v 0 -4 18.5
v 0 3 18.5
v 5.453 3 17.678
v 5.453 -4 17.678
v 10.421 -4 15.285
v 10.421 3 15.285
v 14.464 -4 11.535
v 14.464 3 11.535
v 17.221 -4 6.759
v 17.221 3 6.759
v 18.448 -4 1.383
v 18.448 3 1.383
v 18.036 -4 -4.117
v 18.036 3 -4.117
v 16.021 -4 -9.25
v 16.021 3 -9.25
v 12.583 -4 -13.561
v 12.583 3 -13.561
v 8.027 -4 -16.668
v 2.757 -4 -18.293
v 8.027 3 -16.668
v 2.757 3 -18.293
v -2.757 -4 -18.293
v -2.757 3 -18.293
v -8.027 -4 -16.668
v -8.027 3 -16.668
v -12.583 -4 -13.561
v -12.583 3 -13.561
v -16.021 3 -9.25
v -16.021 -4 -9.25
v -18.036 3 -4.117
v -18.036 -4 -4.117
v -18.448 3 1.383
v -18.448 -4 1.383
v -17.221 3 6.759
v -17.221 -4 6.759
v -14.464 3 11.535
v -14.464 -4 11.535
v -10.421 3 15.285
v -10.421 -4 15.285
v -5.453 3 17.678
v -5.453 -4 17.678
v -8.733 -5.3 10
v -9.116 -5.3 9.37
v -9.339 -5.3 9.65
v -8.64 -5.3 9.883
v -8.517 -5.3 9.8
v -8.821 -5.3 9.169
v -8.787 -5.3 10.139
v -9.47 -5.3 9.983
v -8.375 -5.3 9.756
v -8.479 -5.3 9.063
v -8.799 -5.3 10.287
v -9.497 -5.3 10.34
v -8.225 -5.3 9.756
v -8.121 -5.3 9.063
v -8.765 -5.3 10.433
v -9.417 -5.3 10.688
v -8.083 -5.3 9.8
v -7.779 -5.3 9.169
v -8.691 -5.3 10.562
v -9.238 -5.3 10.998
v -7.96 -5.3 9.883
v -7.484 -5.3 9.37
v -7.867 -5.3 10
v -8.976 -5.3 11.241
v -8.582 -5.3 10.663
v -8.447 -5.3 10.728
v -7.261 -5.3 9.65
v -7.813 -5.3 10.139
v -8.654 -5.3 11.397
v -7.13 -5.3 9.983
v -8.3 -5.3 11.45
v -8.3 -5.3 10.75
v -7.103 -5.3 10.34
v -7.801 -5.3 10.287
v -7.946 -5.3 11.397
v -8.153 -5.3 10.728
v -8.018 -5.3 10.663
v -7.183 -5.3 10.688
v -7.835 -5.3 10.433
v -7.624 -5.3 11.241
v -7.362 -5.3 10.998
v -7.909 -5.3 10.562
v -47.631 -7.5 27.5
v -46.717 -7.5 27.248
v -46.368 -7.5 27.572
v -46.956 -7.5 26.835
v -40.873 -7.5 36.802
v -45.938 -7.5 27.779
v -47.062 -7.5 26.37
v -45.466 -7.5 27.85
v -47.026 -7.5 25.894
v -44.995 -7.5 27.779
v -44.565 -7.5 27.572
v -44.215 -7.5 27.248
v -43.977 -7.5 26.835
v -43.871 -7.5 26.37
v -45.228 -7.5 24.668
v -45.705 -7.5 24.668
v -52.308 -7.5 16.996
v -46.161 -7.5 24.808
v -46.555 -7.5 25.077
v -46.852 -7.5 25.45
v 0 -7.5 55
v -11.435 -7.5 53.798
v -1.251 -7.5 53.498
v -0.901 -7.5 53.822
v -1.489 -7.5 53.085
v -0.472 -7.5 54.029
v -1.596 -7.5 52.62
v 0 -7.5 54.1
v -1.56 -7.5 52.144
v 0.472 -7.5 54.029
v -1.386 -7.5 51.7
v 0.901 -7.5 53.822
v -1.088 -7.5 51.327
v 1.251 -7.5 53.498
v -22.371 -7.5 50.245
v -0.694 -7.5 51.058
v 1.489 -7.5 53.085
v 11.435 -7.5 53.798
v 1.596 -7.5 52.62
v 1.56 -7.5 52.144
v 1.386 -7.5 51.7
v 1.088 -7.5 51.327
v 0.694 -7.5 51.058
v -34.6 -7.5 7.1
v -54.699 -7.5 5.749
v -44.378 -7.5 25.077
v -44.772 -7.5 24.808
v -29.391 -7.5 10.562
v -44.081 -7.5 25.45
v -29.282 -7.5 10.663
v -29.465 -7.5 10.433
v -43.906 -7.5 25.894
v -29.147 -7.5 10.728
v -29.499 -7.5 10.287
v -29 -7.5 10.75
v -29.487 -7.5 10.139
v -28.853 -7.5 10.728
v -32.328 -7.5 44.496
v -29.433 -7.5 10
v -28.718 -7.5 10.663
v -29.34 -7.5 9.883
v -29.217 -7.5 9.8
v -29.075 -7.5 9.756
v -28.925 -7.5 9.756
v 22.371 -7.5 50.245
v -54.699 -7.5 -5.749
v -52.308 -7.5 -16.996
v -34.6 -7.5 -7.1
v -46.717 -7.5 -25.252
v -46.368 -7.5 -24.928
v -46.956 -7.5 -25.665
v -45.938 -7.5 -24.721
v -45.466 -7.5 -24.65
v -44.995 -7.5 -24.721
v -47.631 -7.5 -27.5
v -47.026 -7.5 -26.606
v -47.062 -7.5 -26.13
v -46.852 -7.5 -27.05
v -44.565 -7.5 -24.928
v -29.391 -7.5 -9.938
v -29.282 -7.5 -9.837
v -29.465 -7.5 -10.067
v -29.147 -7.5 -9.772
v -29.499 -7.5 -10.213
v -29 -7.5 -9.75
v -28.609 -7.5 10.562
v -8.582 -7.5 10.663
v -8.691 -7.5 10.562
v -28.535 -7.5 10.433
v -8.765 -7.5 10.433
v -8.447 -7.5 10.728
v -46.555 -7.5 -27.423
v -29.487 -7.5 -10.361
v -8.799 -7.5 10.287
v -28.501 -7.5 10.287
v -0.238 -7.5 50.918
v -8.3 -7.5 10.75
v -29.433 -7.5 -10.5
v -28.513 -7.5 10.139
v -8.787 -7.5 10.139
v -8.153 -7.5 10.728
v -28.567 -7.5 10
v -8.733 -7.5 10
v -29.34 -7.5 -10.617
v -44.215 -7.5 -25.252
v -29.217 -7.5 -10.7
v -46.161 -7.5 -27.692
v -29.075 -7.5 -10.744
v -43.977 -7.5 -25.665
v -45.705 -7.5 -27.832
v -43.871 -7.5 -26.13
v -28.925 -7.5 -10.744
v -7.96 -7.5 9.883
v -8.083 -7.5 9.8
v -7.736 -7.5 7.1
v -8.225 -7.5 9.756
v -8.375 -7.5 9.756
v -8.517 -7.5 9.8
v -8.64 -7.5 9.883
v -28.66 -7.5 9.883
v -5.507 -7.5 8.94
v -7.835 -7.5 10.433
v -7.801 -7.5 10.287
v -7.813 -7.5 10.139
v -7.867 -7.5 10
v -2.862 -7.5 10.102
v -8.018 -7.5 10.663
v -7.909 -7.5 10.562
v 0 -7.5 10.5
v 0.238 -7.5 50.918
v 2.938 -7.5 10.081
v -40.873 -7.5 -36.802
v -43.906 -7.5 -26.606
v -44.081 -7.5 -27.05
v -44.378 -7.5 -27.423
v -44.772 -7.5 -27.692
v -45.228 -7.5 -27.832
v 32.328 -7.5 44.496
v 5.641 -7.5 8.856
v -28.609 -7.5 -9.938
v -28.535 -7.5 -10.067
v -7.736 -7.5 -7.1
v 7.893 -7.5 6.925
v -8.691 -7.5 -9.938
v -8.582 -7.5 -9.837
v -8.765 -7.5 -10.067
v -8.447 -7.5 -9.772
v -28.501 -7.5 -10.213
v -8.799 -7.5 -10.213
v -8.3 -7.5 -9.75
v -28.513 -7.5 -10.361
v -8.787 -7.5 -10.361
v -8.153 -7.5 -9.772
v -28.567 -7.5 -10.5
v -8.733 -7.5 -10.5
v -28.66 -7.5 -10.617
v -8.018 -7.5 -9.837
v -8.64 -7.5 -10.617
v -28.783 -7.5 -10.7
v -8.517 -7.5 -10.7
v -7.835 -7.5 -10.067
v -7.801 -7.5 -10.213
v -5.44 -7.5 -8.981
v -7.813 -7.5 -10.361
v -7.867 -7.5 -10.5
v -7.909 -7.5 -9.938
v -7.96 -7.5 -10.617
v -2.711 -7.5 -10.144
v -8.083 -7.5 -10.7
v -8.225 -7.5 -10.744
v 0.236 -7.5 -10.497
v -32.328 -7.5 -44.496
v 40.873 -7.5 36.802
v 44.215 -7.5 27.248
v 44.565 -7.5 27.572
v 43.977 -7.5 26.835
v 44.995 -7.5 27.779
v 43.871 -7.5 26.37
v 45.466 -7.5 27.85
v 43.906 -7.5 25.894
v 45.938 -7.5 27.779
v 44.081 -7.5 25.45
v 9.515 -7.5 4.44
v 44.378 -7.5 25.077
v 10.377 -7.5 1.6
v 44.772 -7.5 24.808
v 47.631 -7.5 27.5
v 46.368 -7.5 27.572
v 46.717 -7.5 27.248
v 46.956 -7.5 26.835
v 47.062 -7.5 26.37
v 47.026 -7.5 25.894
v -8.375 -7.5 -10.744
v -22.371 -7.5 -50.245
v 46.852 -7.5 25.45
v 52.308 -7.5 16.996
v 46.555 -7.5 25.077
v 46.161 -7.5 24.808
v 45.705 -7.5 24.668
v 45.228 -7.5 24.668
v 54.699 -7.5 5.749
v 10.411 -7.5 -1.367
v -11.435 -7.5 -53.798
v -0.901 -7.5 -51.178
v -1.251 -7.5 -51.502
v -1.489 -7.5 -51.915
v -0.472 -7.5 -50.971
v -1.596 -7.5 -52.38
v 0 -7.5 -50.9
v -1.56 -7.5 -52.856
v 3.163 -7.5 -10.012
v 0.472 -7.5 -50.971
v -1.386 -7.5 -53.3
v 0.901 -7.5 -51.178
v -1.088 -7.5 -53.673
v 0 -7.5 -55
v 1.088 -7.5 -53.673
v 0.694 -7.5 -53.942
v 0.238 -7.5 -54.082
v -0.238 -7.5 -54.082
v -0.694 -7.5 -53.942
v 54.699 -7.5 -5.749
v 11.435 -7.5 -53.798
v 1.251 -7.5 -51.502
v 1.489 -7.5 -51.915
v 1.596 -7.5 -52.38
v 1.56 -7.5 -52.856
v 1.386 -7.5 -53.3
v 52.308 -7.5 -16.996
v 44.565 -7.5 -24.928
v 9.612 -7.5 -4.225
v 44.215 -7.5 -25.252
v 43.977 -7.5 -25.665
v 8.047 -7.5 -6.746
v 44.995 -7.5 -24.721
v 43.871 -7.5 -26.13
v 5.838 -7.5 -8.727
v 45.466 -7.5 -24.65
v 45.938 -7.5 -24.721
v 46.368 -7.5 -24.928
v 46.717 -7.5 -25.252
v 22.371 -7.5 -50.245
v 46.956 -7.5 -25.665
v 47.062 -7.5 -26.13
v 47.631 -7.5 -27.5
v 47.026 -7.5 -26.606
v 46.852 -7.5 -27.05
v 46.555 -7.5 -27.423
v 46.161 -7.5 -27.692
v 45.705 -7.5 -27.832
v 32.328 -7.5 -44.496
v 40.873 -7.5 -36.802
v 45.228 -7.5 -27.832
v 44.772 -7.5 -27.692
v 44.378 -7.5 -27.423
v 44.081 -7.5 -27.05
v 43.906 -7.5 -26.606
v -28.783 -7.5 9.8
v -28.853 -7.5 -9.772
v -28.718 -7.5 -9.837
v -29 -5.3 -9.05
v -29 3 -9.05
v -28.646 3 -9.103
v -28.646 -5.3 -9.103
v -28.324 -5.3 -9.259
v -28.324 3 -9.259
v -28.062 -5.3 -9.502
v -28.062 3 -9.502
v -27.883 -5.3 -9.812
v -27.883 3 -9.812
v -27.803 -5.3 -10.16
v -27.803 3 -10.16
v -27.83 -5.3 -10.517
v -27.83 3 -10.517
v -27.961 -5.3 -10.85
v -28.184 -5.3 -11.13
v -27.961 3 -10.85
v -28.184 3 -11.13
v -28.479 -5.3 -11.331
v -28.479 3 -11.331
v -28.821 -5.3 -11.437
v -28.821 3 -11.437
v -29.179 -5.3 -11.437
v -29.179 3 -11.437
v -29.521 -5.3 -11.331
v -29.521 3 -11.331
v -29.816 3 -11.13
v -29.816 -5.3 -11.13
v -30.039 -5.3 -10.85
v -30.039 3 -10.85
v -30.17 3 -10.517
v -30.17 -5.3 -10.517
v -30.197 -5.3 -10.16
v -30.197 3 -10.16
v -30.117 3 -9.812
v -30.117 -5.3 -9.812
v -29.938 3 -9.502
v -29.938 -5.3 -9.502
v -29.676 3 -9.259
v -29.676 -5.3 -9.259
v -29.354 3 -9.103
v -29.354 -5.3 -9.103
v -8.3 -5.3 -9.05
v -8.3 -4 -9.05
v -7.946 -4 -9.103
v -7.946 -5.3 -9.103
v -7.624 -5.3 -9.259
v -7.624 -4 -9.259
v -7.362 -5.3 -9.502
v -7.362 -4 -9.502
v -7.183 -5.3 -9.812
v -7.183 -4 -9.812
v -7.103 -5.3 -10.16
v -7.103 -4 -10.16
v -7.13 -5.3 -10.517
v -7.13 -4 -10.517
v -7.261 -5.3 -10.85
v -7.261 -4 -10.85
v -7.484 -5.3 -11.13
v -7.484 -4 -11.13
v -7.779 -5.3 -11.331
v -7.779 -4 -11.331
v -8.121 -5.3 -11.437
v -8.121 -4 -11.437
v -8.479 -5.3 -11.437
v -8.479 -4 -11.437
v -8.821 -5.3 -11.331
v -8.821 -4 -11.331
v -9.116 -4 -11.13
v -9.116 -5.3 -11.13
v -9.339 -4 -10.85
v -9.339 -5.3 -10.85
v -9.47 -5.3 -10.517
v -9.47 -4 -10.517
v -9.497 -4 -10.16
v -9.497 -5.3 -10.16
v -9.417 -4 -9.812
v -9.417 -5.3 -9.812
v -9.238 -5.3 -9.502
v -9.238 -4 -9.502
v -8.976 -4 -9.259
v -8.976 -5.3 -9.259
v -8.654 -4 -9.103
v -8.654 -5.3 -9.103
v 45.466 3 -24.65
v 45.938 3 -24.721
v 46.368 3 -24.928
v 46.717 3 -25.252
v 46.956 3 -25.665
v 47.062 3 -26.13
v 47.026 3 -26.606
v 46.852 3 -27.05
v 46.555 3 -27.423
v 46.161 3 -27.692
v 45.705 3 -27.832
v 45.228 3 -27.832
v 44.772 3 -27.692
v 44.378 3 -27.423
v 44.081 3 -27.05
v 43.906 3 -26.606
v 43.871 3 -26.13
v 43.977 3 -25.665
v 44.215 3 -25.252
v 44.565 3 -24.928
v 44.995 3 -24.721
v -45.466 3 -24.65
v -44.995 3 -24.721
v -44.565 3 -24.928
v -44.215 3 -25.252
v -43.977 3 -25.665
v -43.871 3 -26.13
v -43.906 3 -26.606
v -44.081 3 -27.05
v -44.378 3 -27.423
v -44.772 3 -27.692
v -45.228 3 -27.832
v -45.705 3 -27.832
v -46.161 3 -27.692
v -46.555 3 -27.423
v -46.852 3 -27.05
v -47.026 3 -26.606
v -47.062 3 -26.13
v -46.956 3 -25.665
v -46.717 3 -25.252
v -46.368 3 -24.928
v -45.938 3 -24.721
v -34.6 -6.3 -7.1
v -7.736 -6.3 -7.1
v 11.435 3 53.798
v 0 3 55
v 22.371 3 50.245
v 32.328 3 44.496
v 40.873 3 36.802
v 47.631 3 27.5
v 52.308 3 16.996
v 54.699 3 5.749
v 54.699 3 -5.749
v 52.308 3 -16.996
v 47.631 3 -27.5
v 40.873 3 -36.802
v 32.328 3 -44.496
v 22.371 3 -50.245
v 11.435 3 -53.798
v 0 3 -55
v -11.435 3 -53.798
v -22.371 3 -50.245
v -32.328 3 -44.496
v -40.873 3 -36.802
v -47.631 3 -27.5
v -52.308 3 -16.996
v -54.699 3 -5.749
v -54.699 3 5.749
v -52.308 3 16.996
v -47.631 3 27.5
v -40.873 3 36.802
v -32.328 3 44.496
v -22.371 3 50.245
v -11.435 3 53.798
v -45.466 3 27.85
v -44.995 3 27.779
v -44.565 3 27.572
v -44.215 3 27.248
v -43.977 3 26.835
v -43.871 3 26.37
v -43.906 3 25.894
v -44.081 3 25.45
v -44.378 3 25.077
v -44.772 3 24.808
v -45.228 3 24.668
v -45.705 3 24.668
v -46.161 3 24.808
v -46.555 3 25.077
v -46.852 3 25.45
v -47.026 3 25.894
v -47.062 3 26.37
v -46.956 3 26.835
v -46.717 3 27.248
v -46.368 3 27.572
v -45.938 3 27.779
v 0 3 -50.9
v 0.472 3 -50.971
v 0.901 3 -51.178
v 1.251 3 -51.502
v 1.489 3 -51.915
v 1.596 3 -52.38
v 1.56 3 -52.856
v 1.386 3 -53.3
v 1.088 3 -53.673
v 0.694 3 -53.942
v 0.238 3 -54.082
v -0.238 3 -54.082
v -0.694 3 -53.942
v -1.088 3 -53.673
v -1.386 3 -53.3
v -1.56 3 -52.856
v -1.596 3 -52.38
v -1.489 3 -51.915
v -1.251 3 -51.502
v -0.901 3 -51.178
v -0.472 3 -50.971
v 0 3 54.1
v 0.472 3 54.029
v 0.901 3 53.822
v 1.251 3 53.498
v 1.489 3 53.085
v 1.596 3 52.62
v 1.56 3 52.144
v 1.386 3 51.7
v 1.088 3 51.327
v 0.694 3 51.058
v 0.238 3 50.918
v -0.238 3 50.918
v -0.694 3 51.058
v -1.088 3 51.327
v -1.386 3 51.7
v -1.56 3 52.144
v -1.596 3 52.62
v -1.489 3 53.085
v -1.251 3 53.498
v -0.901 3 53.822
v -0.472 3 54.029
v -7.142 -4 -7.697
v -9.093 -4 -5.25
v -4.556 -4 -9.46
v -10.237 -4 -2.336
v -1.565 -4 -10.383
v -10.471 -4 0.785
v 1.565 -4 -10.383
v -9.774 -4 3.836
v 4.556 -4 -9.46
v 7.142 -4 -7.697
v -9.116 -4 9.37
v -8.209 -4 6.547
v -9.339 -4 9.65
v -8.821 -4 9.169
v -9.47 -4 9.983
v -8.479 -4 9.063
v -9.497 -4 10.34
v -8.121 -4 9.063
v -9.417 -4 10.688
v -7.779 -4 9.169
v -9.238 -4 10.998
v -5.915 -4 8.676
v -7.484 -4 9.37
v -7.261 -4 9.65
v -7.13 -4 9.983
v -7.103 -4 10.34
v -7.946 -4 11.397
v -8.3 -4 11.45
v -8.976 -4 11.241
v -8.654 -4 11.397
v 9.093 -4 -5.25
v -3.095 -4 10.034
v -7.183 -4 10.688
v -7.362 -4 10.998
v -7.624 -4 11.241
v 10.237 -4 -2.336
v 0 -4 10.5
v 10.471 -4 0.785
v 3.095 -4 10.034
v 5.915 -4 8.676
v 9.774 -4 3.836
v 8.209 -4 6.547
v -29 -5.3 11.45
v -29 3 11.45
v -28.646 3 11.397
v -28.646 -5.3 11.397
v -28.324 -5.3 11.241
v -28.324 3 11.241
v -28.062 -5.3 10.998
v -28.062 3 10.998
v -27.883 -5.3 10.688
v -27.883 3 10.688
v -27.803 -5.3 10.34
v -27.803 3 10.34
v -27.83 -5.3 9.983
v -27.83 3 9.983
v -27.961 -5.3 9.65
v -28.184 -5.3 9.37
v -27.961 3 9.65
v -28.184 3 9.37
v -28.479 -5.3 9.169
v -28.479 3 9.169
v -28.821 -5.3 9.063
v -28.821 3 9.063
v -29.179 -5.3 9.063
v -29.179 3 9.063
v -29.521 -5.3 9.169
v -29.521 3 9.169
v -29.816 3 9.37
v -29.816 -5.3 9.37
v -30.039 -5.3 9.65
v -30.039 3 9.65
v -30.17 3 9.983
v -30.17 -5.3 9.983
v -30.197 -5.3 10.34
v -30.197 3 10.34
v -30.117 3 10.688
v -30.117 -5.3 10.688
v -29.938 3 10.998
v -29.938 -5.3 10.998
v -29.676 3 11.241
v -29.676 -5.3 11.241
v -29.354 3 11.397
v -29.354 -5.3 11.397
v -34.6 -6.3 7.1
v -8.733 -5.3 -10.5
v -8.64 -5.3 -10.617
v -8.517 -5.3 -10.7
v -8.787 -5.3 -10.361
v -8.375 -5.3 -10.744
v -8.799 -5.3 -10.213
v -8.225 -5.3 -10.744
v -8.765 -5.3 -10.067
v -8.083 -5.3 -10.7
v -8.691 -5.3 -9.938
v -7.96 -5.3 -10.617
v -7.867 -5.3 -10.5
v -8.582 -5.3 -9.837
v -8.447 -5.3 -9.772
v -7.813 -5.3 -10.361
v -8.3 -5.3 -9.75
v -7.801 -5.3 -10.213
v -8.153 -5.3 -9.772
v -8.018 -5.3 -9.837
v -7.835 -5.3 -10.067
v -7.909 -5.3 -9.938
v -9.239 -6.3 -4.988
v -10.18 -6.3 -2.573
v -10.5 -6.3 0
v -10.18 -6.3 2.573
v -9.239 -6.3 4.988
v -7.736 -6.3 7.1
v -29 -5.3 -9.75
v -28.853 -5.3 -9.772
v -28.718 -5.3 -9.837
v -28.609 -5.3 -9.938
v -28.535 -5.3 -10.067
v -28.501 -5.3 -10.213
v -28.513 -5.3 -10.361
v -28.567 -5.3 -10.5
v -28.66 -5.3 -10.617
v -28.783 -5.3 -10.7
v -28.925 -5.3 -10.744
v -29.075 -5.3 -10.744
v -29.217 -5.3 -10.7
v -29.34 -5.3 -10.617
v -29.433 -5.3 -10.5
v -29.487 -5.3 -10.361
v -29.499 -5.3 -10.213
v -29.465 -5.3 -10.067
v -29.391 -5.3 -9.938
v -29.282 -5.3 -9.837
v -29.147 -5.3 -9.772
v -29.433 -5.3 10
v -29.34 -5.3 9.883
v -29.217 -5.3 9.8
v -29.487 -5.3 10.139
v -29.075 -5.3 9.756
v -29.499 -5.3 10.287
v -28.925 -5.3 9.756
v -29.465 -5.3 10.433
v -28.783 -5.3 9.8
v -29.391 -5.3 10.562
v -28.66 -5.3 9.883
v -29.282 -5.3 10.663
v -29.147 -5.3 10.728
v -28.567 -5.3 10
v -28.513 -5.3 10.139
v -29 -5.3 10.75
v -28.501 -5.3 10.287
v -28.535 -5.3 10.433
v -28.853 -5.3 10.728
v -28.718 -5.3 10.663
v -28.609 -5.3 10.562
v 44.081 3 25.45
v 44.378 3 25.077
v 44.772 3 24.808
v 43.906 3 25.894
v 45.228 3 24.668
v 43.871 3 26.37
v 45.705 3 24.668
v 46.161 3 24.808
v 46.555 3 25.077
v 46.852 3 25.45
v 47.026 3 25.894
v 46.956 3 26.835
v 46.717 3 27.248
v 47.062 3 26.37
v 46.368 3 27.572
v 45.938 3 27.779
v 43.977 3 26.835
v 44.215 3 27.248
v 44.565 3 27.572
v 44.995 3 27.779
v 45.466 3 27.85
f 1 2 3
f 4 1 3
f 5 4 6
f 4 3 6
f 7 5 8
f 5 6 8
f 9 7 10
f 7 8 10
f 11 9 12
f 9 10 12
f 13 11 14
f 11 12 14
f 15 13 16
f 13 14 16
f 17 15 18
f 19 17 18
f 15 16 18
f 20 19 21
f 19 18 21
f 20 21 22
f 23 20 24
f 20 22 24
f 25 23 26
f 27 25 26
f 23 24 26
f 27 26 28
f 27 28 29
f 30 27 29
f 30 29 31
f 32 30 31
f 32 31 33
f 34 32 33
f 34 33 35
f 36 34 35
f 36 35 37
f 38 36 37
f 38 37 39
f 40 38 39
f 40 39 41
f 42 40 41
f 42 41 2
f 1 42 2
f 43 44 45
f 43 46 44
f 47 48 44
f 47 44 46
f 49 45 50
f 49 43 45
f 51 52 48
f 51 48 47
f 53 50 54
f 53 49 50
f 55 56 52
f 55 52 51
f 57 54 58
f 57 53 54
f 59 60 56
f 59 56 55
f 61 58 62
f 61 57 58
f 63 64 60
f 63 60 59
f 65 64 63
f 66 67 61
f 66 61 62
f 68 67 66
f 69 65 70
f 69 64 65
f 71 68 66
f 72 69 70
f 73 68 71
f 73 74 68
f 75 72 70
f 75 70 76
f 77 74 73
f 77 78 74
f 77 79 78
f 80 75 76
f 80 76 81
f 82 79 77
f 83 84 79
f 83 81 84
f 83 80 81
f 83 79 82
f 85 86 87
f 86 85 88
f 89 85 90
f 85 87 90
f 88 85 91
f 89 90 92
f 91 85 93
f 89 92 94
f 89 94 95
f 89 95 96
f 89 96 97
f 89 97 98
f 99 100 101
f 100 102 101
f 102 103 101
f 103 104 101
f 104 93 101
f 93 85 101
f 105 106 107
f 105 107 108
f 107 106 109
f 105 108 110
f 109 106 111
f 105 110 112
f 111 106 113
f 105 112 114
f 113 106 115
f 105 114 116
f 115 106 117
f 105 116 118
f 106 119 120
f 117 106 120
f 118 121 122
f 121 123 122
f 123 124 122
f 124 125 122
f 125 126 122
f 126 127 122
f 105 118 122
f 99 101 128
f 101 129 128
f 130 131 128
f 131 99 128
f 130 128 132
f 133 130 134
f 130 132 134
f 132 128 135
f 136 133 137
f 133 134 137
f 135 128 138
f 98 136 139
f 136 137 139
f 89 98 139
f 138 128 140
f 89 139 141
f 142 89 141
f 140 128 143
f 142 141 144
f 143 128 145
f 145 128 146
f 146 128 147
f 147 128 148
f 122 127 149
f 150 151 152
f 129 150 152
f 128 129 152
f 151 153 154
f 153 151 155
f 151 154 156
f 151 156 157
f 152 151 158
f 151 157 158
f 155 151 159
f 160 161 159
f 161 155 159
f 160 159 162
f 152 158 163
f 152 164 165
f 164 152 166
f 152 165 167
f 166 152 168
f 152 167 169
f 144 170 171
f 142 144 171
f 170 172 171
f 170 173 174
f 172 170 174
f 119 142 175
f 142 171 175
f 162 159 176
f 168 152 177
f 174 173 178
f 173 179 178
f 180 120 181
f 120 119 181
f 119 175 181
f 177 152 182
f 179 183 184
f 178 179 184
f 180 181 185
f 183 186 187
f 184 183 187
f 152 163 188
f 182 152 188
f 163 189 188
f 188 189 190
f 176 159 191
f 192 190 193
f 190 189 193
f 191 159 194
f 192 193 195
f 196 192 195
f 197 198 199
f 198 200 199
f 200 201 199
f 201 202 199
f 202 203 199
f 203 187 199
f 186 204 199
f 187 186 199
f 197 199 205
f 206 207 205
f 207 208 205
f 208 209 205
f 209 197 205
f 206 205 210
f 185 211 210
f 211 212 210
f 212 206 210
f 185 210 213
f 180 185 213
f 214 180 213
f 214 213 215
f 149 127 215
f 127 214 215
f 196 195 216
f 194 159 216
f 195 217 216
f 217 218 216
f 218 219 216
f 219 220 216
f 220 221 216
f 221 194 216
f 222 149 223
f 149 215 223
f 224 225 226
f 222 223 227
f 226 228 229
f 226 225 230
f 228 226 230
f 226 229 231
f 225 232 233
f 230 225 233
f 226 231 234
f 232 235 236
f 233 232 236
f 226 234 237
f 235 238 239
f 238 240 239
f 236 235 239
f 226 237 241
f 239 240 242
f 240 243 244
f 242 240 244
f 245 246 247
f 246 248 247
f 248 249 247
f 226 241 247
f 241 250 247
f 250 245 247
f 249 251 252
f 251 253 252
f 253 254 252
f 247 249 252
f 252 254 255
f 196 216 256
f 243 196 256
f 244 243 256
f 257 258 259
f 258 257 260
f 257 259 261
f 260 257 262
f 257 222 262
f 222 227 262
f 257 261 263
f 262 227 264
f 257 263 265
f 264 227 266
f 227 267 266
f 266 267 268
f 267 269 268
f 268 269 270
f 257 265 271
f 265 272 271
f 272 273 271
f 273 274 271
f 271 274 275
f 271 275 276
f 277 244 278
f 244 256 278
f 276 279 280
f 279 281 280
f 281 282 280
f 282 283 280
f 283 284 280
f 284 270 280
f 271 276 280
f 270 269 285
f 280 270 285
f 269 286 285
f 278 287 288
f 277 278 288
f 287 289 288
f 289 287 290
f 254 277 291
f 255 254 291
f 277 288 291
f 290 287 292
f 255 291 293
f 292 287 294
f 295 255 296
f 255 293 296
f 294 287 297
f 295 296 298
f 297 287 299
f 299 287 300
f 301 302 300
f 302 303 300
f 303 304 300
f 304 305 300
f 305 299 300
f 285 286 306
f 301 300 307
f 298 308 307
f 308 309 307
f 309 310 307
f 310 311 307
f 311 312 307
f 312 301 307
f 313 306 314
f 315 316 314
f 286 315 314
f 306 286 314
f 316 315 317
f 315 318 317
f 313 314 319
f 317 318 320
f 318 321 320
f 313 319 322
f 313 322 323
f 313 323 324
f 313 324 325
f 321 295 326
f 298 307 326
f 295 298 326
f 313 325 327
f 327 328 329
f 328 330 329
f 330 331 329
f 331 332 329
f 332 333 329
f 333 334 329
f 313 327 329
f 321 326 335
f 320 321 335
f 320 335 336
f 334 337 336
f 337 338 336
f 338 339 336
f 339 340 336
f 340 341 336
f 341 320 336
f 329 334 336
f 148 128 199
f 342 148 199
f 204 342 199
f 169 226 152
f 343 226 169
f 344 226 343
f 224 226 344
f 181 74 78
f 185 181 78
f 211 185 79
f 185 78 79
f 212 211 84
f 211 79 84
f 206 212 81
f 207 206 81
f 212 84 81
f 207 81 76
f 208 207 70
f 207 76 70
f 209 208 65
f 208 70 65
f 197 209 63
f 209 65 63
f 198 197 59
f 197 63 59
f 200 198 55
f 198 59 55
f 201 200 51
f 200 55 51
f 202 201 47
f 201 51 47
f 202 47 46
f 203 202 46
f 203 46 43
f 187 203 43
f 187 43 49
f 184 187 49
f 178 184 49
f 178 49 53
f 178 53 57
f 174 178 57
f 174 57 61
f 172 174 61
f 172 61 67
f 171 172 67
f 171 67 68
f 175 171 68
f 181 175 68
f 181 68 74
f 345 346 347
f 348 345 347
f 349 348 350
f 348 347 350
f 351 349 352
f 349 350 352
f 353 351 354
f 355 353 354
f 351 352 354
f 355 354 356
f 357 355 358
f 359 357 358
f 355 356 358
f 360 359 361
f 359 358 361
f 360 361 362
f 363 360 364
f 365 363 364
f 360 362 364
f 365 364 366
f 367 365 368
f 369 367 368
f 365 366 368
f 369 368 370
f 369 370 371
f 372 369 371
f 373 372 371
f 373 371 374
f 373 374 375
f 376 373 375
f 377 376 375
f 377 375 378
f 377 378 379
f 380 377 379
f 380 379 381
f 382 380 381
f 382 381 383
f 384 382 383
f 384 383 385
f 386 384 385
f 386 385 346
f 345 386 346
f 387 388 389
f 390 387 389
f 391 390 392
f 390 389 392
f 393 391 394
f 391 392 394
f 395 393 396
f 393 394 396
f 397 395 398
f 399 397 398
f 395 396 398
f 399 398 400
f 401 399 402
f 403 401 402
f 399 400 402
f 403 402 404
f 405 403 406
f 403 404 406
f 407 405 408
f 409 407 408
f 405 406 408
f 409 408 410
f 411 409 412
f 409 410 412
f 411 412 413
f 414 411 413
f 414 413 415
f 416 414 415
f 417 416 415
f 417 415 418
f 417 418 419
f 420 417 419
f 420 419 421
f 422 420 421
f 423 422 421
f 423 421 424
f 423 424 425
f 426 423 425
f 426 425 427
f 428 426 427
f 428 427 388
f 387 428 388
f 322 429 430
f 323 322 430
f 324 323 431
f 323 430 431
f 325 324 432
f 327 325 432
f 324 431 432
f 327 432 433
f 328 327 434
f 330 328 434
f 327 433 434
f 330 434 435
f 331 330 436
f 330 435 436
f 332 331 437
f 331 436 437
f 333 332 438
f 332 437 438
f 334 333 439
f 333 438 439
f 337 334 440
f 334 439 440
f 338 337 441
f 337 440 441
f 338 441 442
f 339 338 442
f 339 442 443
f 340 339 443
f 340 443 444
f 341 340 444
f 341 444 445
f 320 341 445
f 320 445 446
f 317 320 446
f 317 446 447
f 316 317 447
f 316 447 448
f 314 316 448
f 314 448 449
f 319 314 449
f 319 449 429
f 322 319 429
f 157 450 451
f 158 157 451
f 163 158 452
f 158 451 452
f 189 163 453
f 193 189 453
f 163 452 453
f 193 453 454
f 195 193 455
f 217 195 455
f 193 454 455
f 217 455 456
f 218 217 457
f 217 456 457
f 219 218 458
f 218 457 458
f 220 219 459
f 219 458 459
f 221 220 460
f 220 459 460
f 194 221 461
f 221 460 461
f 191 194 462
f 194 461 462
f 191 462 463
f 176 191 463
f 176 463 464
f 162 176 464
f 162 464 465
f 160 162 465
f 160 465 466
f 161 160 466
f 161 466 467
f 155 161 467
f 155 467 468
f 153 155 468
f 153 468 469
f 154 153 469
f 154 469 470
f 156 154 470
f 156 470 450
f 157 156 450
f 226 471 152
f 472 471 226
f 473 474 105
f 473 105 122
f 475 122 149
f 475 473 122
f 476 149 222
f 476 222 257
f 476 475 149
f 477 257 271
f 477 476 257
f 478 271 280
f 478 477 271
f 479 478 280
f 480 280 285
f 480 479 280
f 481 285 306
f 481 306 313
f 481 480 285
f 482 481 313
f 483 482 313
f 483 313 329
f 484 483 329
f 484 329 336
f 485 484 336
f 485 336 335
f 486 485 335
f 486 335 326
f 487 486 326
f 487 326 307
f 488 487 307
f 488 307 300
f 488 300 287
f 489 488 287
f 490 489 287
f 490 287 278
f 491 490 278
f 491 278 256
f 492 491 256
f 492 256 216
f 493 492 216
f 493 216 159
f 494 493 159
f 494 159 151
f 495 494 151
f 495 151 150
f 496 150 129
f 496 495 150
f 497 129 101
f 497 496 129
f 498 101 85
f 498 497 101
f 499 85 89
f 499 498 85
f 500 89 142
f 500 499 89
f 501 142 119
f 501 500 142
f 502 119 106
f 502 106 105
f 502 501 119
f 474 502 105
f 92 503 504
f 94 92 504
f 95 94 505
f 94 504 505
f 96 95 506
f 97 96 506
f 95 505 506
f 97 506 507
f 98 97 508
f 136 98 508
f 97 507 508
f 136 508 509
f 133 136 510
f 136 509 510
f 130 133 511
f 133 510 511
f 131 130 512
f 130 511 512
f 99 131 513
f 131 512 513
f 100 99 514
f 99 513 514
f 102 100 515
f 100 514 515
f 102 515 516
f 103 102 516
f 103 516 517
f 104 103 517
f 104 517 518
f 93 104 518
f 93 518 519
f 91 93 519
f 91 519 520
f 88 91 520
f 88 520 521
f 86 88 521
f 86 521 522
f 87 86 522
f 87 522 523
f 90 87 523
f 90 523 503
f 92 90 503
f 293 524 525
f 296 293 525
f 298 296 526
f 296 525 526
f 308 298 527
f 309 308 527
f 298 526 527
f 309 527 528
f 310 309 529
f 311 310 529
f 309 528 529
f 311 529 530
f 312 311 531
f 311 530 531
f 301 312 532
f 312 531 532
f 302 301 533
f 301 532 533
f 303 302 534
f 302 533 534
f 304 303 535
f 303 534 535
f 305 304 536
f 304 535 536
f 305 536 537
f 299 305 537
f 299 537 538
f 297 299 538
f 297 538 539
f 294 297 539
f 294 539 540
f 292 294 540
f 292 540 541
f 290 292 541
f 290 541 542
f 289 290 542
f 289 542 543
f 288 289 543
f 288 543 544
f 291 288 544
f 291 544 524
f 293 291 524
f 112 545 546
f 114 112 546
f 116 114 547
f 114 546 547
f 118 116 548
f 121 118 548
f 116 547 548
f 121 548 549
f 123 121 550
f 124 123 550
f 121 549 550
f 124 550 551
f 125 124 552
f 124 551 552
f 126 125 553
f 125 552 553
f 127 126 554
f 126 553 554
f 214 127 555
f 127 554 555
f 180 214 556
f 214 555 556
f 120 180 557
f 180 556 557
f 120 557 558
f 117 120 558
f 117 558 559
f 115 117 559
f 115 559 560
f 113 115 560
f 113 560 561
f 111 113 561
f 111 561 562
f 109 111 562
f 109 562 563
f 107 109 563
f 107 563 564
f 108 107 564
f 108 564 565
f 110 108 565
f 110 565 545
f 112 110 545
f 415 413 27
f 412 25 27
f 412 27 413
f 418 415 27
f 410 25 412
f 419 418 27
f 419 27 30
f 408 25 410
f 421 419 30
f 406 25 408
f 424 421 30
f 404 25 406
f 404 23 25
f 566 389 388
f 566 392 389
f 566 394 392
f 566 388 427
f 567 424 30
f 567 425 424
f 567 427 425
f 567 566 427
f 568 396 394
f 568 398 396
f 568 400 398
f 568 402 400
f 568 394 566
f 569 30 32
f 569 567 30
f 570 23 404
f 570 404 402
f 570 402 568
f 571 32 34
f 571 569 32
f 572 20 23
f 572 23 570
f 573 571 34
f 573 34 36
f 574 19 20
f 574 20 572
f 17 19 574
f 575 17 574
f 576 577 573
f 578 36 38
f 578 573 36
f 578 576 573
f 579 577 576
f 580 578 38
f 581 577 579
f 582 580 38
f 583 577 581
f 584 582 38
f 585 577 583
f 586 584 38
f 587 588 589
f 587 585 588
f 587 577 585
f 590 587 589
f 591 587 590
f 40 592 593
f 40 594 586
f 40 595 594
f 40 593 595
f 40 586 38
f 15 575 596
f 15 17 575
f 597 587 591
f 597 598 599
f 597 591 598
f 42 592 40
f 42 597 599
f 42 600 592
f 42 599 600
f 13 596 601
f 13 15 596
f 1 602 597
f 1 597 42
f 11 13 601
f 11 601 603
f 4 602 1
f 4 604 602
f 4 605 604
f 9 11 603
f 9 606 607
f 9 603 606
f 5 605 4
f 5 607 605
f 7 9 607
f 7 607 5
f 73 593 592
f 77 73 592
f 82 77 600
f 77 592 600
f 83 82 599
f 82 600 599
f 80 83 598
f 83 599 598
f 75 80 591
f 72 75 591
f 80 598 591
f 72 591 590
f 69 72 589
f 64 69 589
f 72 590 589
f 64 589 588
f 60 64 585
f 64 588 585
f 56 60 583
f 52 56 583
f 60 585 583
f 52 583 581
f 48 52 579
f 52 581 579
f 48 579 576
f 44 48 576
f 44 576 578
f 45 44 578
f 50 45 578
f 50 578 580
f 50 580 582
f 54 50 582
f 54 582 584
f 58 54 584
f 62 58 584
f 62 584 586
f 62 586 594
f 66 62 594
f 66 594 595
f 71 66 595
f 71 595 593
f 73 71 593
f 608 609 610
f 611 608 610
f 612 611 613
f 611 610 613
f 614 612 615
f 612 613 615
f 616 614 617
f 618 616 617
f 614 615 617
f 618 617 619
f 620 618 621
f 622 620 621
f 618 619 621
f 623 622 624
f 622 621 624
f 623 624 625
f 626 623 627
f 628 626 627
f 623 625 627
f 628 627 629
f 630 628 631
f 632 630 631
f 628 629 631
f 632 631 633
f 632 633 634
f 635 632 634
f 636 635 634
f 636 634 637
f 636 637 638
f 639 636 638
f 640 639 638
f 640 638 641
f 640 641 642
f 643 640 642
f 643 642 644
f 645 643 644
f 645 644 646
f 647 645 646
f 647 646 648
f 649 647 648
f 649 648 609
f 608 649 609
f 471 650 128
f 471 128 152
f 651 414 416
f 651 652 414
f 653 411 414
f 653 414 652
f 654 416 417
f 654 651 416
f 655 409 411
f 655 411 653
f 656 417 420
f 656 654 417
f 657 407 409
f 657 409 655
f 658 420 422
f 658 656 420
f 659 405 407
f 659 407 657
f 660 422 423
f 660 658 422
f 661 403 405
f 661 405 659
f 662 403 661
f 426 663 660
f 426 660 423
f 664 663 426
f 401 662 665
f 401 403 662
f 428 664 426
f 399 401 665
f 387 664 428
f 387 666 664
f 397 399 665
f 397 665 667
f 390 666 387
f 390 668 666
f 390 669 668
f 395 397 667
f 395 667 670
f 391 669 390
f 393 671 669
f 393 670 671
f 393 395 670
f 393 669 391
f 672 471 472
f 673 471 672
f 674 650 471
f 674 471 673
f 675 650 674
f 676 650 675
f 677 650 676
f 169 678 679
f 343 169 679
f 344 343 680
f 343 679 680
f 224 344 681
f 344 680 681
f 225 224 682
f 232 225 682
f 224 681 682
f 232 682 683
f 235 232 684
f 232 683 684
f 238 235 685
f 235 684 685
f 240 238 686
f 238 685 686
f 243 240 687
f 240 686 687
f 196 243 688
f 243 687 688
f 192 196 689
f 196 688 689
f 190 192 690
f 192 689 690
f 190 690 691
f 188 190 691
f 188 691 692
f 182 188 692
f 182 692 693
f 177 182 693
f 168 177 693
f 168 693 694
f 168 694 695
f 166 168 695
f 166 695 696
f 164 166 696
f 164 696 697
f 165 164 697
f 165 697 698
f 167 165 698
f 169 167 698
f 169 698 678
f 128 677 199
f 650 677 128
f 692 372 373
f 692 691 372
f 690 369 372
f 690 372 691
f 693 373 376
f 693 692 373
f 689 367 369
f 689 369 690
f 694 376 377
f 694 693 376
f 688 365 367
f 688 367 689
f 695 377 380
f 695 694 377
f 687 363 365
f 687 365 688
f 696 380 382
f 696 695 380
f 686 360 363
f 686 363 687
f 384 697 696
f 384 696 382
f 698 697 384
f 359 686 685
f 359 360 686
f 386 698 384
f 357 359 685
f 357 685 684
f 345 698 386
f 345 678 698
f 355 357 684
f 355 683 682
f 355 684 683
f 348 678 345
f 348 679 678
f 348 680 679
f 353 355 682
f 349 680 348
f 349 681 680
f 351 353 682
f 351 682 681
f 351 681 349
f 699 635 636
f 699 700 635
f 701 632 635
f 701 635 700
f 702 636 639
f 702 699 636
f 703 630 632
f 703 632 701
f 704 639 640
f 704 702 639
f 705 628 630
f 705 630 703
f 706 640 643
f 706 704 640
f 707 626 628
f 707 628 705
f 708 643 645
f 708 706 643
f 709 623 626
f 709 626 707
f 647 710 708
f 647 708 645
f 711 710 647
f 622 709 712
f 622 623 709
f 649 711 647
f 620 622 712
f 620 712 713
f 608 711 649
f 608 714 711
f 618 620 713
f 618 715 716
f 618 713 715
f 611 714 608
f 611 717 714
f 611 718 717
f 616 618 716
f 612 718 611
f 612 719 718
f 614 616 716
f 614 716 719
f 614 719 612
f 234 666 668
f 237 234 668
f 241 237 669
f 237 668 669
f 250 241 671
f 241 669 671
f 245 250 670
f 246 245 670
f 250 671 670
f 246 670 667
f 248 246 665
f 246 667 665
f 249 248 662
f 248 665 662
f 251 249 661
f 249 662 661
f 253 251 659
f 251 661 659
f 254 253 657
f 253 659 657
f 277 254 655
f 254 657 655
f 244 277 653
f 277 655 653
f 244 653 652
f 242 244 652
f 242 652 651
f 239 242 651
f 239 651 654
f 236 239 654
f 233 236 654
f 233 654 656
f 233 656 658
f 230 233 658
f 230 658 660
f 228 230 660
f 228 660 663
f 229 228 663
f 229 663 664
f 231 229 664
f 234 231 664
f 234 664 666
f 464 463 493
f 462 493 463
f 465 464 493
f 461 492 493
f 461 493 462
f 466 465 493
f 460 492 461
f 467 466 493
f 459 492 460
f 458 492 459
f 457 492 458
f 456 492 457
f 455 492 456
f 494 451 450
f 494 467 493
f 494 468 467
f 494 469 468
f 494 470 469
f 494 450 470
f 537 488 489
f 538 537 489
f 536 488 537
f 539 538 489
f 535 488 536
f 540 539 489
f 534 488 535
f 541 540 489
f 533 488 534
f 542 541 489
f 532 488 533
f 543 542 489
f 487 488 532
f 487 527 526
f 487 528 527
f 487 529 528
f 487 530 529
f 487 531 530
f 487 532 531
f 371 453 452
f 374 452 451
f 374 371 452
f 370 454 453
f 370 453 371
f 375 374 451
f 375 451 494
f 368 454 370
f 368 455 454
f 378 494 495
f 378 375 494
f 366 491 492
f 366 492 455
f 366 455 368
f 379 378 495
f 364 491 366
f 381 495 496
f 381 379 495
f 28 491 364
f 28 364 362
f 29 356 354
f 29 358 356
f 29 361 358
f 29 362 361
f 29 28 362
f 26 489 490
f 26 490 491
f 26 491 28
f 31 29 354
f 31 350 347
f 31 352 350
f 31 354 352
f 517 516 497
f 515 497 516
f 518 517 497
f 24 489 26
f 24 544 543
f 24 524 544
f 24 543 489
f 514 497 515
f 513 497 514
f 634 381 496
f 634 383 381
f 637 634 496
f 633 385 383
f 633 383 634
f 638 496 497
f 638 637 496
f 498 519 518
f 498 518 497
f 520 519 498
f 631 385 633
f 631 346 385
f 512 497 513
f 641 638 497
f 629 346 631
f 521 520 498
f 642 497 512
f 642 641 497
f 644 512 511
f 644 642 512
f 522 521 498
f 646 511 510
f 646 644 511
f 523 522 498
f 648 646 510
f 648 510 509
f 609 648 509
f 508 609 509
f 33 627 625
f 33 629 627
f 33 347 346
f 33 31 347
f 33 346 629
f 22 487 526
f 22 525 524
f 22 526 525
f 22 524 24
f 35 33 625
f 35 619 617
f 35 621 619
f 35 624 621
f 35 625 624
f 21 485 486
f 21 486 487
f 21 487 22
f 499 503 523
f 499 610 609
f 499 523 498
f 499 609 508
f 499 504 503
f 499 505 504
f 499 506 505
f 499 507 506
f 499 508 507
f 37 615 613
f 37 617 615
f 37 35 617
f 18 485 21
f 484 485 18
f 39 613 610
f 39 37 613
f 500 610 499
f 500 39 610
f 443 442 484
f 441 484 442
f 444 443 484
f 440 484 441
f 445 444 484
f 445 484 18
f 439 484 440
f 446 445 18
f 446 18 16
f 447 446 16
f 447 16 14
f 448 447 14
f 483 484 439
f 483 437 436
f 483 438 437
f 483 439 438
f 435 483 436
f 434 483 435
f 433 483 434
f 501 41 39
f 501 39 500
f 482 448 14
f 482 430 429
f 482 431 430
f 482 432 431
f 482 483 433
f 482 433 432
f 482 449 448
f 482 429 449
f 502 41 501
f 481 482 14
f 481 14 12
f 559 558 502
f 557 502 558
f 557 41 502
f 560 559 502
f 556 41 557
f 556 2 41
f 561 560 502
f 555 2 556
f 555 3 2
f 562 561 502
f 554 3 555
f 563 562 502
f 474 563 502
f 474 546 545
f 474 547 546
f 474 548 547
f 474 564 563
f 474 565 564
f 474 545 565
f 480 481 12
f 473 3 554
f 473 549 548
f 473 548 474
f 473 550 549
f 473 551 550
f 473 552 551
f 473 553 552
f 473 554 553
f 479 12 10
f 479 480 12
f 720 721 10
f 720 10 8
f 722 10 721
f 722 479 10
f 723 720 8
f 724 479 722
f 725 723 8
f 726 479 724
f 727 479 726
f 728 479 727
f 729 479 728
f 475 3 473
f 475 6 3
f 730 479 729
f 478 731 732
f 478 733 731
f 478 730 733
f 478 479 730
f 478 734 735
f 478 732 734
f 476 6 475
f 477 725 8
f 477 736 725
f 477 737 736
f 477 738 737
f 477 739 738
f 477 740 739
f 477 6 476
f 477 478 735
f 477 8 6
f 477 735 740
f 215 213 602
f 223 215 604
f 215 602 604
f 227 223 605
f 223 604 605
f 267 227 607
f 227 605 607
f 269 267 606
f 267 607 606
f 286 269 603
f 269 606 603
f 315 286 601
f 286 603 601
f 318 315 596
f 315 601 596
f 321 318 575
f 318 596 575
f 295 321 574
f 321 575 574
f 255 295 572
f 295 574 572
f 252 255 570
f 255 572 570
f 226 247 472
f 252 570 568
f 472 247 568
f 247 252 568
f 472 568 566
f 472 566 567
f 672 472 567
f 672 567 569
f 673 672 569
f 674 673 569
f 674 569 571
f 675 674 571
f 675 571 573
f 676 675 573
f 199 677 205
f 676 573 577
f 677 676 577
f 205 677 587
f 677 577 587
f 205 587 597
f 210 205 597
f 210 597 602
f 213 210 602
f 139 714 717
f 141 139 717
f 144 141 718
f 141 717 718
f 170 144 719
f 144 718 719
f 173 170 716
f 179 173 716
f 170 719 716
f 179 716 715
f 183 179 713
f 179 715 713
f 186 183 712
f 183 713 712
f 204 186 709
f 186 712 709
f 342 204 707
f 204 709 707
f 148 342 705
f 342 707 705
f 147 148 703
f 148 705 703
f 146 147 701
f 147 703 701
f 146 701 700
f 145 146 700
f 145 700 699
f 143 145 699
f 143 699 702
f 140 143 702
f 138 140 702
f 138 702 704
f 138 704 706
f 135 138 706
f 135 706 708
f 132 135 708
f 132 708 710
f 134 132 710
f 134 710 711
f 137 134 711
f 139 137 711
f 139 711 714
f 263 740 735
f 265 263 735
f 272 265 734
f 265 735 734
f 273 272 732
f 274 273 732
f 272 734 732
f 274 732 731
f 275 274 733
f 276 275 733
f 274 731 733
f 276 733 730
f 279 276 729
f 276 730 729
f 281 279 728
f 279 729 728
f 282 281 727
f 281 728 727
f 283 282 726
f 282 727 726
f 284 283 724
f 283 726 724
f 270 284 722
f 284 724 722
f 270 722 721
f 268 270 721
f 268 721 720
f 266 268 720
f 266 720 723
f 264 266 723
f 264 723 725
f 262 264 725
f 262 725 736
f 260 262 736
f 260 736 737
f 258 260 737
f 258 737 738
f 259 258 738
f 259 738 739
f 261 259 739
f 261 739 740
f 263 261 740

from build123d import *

# Parameters (mm, degrees)
SKETCH1_R           = 55
SKETCH1_R_2         = 50
SKETCH1_R_3         = 1.6
BOSS_EXTRUDE1_DEPTH = 7.5
SKETCH2_3_R         = 50
SKETCH2_3_R_2       = 10.5
BOSS_EXTRUDE2_DEPTH = 7.5
SKETCH2_R           = 0.5
CUT_EXTRUDE1_DEPTH  = 7.5
SKETCH2_3_2_R       = 1.2
SKETCH2_3_2_R_2     = 0.5
CUT_EXTRUDE2_DEPTH  = 5.3
CUT_EXTRUDE3_START  = -1.2
CUT_EXTRUDE3_DEPTH  = 1.2
SKETCH4_R           = 18.5
CUT_EXTRUDE4_DEPTH  = 4
BOSS_EXTRUDE3_START = 3
SKETCH5_R           = 55
SKETCH5_R_2         = 18.5
SKETCH5_R_3         = 1.6
SKETCH5_R_4         = 1.2
BOSS_EXTRUDE3_DEPTH = 3


with BuildPart() as part:
    # Sketch1 → Boss-Extrude1 (new body)
    with BuildSketch(Plane(origin=(0, 0, 0), x_dir=(1, 0, 0), z_dir=(0, 1, 0))):
        with Locations(Location((0, 0, 0), (0, 0, 270))):
            Circle(SKETCH1_R)
        with Locations(Location((0, 0, 0), (0, 0, 270))):
            Circle(SKETCH1_R_2, mode=Mode.SUBTRACT)
        with Locations(Location((0, 52.5, 0), (0, 0, 270))):
            Circle(SKETCH1_R_3, mode=Mode.SUBTRACT)
        with Locations(Location((45.466333699, 26.25, 0), (0, 0, 270))):
            Circle(SKETCH1_R_3, mode=Mode.SUBTRACT)
        with Locations(Location((45.466333699, -26.25, 0), (0, 0, 270))):
            Circle(SKETCH1_R_3, mode=Mode.SUBTRACT)
        with Locations(Location((0, -52.5, 0), (0, 0, 270))):
            Circle(SKETCH1_R_3, mode=Mode.SUBTRACT)
        with Locations(Location((-45.466333699, -26.25, 0), (0, 0, 270))):
            Circle(SKETCH1_R_3, mode=Mode.SUBTRACT)
        with Locations(Location((-45.466333699, 26.25, 0), (0, 0, 270))):
            Circle(SKETCH1_R_3, mode=Mode.SUBTRACT)
    extrude(amount=-BOSS_EXTRUDE1_DEPTH)

    # Sketch2_3 → Boss-Extrude2 (add)
    with BuildSketch(Plane(origin=(0, 0, 0), x_dir=(1, 0, 0), z_dir=(0, 1, 0))):
        Circle(SKETCH2_3_R)
        with Locations(Location((0, 0, 0), (0, 0, 270))):
            Circle(SKETCH2_3_R_2, mode=Mode.SUBTRACT)
    extrude(amount=-BOSS_EXTRUDE2_DEPTH)

    # Sketch2 → Cut-Extrude1 (cut)
    with BuildSketch(Plane(origin=(0, 0, 0), x_dir=(1, 0, 0), z_dir=(0, 1, 0))):
        with Locations(Location((-29, 10.25, 0), (0, 0, 270))):
            Circle(SKETCH2_R)
        with Locations(Location((-8.3, 10.25, 0), (0, 0, 270))):
            Circle(SKETCH2_R)
        with Locations(Location((-8.3, -10.25, 0), (0, 0, 270))):
            Circle(SKETCH2_R)
        with Locations(Location((-29, -10.25, 0), (0, 0, 270))):
            Circle(SKETCH2_R)
    extrude(amount=-CUT_EXTRUDE1_DEPTH, mode=Mode.SUBTRACT)

    # Sketch2_3 2 → Cut-Extrude2 (cut)
    # profile 1 of 4: a face of its own
    with BuildSketch(Plane(origin=(0, 0, 0), x_dir=(1, 0, 0), z_dir=(0, 1, 0))):
        with Locations(Location((-29, 10.25, 0), (0, 0, 270))):
            Circle(SKETCH2_3_2_R)
        with Locations(Location((-29, 10.25, 0), (0, 0, 270))):
            Circle(SKETCH2_3_2_R_2, mode=Mode.SUBTRACT)
    # profile 2 of 4: a face of its own
    with BuildSketch(Plane(origin=(0, 0, 0), x_dir=(1, 0, 0), z_dir=(0, 1, 0))):
        with Locations(Location((-8.3, 10.25, 0), (0, 0, 270))):
            Circle(SKETCH2_3_2_R)
        with Locations(Location((-8.3, 10.25, 0), (0, 0, 270))):
            Circle(SKETCH2_3_2_R_2, mode=Mode.SUBTRACT)
    # profile 3 of 4: a face of its own
    with BuildSketch(Plane(origin=(0, 0, 0), x_dir=(1, 0, 0), z_dir=(0, 1, 0))):
        with Locations(Location((-8.3, -10.25, 0), (0, 0, 270))):
            Circle(SKETCH2_3_2_R)
        with Locations(Location((-8.3, -10.25, 0), (0, 0, 270))):
            Circle(SKETCH2_3_2_R_2, mode=Mode.SUBTRACT)
    # profile 4 of 4: a face of its own
    with BuildSketch(Plane(origin=(0, 0, 0), x_dir=(1, 0, 0), z_dir=(0, 1, 0))):
        with Locations(Location((-29, -10.25, 0), (0, 0, 270))):
            Circle(SKETCH2_3_2_R)
        with Locations(Location((-29, -10.25, 0), (0, 0, 270))):
            Circle(SKETCH2_3_2_R_2, mode=Mode.SUBTRACT)
    extrude(amount=-CUT_EXTRUDE2_DEPTH, mode=Mode.SUBTRACT)

    # Sketch3 → Cut-Extrude3 (cut)
    with BuildSketch(Plane.XZ.offset(7.5).offset(CUT_EXTRUDE3_START)):
        with BuildLine():
            Line((-34.6, 0), (-10.5, 0))
            ThreePointArc((-10.5, 0), (-9.784532036, 3.809584338), (-7.735631842, 7.1))
            Line((-7.735631842, 7.1), (-34.6, 7.1))
            Line((-34.6, 7.1), (-34.6, 0))
        make_face()
        with BuildLine():
            ThreePointArc((-7.735631842, -7.1), (-9.784532036, -3.809584338), (-10.5, 0))
            Line((-10.5, 0), (-34.6, 0))
            Line((-34.6, 0), (-34.6, -7.1))
            Line((-34.6, -7.1), (-7.735631842, -7.1))
        make_face()
    extrude(amount=CUT_EXTRUDE3_DEPTH, mode=Mode.SUBTRACT)

    # Sketch4 → Cut-Extrude4 (cut)
    with BuildSketch(Plane(origin=(0, 0, 0), x_dir=(1, 0, 0), z_dir=(0, 1, 0))):
        with Locations(Location((0, 0, 0), (0, 0, 270))):
            Circle(SKETCH4_R)
    extrude(amount=-CUT_EXTRUDE4_DEPTH, mode=Mode.SUBTRACT)

    # Sketch5 → Boss-Extrude3 (add)
    with BuildSketch(Plane(origin=(0, 0, 0), x_dir=(1, 0, 0), z_dir=(0, 1, 0)).offset(BOSS_EXTRUDE3_START)):
        with Locations(Location((0, 0, 0), (0, 0, 270))):
            Circle(SKETCH5_R)
        with Locations(Location((0, 0, 0), (0, 0, 270))):
            Circle(SKETCH5_R_2, mode=Mode.SUBTRACT)
        with Locations(Location((0, 52.5, 0), (0, 0, 270))):
            Circle(SKETCH5_R_3, mode=Mode.SUBTRACT)
        with Locations(Location((-45.466333699, -26.25, 0), (0, 0, 270))):
            Circle(SKETCH5_R_3, mode=Mode.SUBTRACT)
        with Locations(Location((45.466333699, -26.25, 0), (0, 0, 270))):
            Circle(SKETCH5_R_3, mode=Mode.SUBTRACT)
        with Locations(Location((-29, -10.25, 0), (0, 0, 270))):
            Circle(SKETCH5_R_4, mode=Mode.SUBTRACT)
        with Locations(Location((45.466333699, 26.25, 0), (0, 0, 270))):
            Circle(SKETCH5_R_3, mode=Mode.SUBTRACT)
        with Locations(Location((0, -52.5, 0), (0, 0, 270))):
            Circle(SKETCH5_R_3, mode=Mode.SUBTRACT)
        with Locations(Location((-45.466333699, 26.25, 0), (0, 0, 270))):
            Circle(SKETCH5_R_3, mode=Mode.SUBTRACT)
        with Locations(Location((-29, 10.25, 0), (0, 0, 270))):
            Circle(SKETCH5_R_4, mode=Mode.SUBTRACT)
    extrude(amount=-BOSS_EXTRUDE3_DEPTH)


solid = part.part
